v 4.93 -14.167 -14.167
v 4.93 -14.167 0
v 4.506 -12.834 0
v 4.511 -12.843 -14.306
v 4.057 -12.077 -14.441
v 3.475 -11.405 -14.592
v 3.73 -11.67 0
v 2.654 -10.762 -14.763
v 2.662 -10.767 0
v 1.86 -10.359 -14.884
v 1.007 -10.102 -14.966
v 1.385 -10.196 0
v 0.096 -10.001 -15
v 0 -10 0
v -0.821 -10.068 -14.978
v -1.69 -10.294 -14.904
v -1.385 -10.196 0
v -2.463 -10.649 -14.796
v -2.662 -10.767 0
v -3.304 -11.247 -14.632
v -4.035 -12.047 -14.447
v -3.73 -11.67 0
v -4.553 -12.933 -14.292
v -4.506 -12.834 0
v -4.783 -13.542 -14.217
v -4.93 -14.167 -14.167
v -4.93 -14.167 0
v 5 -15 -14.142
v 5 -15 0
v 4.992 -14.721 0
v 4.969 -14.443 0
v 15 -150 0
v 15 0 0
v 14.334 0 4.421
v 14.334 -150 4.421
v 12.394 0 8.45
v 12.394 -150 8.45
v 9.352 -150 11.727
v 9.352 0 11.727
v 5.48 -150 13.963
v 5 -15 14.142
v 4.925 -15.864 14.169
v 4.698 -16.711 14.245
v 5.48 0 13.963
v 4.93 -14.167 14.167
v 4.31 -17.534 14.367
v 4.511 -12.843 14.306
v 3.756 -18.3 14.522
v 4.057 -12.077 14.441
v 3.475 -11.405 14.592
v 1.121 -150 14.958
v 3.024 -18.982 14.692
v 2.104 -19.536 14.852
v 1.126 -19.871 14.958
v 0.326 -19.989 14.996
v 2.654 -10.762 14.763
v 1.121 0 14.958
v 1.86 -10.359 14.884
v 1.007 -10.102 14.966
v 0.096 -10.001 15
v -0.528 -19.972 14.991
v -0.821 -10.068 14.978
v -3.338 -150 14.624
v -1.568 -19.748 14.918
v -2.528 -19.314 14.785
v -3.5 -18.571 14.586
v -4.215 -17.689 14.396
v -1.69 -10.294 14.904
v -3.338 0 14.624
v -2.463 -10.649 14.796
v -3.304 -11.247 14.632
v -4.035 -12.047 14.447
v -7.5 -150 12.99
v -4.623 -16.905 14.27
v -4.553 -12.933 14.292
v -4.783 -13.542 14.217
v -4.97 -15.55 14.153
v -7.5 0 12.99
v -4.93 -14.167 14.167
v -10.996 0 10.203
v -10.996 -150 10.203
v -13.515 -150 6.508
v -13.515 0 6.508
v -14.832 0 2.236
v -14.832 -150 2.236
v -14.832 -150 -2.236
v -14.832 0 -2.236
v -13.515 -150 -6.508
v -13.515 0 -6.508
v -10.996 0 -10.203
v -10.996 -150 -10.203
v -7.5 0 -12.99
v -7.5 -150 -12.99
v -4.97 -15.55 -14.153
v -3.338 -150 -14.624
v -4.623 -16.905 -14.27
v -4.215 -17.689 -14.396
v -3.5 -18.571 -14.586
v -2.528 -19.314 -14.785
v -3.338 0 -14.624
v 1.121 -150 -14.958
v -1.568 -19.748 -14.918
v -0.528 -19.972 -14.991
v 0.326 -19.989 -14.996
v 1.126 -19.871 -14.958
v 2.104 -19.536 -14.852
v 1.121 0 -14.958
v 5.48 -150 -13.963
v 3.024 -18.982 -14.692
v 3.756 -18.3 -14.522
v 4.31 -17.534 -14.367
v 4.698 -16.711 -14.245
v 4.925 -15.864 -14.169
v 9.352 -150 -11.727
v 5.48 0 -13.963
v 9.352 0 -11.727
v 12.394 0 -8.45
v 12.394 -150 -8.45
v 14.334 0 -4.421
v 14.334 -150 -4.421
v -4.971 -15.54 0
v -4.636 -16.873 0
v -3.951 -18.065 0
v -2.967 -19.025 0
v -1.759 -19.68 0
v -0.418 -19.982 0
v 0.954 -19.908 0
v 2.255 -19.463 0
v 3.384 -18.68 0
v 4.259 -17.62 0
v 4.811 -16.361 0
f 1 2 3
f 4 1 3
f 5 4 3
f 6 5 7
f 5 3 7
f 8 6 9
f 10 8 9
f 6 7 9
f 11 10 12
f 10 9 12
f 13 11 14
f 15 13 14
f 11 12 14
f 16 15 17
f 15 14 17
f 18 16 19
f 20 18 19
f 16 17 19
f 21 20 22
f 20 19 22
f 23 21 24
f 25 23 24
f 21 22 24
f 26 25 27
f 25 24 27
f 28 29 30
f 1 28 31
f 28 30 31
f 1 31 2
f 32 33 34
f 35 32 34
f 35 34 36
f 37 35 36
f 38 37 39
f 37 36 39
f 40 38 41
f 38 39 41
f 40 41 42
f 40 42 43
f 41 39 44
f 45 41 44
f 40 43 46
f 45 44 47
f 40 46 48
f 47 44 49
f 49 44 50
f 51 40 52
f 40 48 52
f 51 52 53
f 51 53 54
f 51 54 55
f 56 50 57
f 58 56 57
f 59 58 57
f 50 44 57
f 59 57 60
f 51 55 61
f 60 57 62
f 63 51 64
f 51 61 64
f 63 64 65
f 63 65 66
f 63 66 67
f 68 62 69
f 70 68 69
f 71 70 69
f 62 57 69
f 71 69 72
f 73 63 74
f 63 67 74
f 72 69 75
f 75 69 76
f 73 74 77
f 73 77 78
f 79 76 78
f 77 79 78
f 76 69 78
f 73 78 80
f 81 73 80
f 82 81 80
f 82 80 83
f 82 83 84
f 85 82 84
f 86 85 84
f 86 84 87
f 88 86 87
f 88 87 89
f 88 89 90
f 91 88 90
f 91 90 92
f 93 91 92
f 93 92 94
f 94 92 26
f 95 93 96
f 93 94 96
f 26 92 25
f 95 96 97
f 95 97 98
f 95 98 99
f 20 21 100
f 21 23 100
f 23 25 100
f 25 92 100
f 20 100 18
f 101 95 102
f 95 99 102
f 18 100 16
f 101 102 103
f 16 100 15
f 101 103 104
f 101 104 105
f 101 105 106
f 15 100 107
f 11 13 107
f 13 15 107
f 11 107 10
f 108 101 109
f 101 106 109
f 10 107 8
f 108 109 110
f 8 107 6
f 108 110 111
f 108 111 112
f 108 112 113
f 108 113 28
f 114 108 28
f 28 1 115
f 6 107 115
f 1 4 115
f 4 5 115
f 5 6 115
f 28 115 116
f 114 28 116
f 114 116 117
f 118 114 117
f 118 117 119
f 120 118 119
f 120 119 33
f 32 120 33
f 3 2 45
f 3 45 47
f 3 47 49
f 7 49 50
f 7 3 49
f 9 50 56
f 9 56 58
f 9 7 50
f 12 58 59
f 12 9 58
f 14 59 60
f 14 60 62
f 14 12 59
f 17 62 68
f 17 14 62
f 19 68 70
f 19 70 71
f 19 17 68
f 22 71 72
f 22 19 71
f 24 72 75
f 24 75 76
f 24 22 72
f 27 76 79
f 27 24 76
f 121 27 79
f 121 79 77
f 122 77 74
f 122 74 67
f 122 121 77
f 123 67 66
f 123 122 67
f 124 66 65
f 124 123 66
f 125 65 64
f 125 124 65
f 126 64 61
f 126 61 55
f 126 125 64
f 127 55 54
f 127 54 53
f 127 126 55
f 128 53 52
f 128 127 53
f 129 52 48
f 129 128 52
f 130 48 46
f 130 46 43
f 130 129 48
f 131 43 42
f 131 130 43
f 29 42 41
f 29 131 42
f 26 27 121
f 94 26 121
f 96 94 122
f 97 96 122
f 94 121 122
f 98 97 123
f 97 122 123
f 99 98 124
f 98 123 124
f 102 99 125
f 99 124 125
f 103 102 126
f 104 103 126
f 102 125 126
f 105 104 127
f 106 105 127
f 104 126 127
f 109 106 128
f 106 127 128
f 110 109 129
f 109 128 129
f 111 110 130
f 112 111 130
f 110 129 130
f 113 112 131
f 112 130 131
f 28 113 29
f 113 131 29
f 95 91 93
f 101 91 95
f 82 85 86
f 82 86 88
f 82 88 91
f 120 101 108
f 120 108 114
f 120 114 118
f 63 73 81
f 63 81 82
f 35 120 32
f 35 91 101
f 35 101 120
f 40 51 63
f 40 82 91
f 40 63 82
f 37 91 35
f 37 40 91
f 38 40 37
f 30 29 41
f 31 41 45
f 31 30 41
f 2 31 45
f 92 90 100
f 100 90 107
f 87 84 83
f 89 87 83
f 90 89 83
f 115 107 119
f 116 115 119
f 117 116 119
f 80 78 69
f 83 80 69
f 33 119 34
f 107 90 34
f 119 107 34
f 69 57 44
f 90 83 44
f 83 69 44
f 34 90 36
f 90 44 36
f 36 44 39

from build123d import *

# Parameters (mm, degrees)
F0_R     = 15
F1_DEPTH = 150
F3_DEPTH = 19.9


with BuildPart() as f1:
    # F0 (on Front) → F1 (new body)
    with BuildSketch(Plane.XZ):
        Circle(F0_R)
    extrude(amount=F1_DEPTH)

    # F2 (on Top) → F3 (cut, symmetric)
    with BuildSketch(Plane.XY):
        with BuildLine():
            ThreePointArc((4.9300664859, -14.1666666667), (0, -15), (-4.9300664859, -14.1666666667))
            ThreePointArc((-4.9300664859, -14.1666666667), (-0.4181313014, -19.9824859473), (5, -15))
            ThreePointArc((5, -15), (4.9824859473, -14.5818686986), (4.9300664859, -14.1666666667))
        make_face()
        with BuildLine():
            ThreePointArc((4.9300664859, -14.1666666667), (0, -10), (-4.9300664859, -14.1666666667))
            ThreePointArc((-4.9300664859, -14.1666666667), (0, -15), (4.9300664859, -14.1666666667))
        make_face()
    extrude(amount=F3_DEPTH, both=True, mode=Mode.SUBTRACT)


solid = f1.part
